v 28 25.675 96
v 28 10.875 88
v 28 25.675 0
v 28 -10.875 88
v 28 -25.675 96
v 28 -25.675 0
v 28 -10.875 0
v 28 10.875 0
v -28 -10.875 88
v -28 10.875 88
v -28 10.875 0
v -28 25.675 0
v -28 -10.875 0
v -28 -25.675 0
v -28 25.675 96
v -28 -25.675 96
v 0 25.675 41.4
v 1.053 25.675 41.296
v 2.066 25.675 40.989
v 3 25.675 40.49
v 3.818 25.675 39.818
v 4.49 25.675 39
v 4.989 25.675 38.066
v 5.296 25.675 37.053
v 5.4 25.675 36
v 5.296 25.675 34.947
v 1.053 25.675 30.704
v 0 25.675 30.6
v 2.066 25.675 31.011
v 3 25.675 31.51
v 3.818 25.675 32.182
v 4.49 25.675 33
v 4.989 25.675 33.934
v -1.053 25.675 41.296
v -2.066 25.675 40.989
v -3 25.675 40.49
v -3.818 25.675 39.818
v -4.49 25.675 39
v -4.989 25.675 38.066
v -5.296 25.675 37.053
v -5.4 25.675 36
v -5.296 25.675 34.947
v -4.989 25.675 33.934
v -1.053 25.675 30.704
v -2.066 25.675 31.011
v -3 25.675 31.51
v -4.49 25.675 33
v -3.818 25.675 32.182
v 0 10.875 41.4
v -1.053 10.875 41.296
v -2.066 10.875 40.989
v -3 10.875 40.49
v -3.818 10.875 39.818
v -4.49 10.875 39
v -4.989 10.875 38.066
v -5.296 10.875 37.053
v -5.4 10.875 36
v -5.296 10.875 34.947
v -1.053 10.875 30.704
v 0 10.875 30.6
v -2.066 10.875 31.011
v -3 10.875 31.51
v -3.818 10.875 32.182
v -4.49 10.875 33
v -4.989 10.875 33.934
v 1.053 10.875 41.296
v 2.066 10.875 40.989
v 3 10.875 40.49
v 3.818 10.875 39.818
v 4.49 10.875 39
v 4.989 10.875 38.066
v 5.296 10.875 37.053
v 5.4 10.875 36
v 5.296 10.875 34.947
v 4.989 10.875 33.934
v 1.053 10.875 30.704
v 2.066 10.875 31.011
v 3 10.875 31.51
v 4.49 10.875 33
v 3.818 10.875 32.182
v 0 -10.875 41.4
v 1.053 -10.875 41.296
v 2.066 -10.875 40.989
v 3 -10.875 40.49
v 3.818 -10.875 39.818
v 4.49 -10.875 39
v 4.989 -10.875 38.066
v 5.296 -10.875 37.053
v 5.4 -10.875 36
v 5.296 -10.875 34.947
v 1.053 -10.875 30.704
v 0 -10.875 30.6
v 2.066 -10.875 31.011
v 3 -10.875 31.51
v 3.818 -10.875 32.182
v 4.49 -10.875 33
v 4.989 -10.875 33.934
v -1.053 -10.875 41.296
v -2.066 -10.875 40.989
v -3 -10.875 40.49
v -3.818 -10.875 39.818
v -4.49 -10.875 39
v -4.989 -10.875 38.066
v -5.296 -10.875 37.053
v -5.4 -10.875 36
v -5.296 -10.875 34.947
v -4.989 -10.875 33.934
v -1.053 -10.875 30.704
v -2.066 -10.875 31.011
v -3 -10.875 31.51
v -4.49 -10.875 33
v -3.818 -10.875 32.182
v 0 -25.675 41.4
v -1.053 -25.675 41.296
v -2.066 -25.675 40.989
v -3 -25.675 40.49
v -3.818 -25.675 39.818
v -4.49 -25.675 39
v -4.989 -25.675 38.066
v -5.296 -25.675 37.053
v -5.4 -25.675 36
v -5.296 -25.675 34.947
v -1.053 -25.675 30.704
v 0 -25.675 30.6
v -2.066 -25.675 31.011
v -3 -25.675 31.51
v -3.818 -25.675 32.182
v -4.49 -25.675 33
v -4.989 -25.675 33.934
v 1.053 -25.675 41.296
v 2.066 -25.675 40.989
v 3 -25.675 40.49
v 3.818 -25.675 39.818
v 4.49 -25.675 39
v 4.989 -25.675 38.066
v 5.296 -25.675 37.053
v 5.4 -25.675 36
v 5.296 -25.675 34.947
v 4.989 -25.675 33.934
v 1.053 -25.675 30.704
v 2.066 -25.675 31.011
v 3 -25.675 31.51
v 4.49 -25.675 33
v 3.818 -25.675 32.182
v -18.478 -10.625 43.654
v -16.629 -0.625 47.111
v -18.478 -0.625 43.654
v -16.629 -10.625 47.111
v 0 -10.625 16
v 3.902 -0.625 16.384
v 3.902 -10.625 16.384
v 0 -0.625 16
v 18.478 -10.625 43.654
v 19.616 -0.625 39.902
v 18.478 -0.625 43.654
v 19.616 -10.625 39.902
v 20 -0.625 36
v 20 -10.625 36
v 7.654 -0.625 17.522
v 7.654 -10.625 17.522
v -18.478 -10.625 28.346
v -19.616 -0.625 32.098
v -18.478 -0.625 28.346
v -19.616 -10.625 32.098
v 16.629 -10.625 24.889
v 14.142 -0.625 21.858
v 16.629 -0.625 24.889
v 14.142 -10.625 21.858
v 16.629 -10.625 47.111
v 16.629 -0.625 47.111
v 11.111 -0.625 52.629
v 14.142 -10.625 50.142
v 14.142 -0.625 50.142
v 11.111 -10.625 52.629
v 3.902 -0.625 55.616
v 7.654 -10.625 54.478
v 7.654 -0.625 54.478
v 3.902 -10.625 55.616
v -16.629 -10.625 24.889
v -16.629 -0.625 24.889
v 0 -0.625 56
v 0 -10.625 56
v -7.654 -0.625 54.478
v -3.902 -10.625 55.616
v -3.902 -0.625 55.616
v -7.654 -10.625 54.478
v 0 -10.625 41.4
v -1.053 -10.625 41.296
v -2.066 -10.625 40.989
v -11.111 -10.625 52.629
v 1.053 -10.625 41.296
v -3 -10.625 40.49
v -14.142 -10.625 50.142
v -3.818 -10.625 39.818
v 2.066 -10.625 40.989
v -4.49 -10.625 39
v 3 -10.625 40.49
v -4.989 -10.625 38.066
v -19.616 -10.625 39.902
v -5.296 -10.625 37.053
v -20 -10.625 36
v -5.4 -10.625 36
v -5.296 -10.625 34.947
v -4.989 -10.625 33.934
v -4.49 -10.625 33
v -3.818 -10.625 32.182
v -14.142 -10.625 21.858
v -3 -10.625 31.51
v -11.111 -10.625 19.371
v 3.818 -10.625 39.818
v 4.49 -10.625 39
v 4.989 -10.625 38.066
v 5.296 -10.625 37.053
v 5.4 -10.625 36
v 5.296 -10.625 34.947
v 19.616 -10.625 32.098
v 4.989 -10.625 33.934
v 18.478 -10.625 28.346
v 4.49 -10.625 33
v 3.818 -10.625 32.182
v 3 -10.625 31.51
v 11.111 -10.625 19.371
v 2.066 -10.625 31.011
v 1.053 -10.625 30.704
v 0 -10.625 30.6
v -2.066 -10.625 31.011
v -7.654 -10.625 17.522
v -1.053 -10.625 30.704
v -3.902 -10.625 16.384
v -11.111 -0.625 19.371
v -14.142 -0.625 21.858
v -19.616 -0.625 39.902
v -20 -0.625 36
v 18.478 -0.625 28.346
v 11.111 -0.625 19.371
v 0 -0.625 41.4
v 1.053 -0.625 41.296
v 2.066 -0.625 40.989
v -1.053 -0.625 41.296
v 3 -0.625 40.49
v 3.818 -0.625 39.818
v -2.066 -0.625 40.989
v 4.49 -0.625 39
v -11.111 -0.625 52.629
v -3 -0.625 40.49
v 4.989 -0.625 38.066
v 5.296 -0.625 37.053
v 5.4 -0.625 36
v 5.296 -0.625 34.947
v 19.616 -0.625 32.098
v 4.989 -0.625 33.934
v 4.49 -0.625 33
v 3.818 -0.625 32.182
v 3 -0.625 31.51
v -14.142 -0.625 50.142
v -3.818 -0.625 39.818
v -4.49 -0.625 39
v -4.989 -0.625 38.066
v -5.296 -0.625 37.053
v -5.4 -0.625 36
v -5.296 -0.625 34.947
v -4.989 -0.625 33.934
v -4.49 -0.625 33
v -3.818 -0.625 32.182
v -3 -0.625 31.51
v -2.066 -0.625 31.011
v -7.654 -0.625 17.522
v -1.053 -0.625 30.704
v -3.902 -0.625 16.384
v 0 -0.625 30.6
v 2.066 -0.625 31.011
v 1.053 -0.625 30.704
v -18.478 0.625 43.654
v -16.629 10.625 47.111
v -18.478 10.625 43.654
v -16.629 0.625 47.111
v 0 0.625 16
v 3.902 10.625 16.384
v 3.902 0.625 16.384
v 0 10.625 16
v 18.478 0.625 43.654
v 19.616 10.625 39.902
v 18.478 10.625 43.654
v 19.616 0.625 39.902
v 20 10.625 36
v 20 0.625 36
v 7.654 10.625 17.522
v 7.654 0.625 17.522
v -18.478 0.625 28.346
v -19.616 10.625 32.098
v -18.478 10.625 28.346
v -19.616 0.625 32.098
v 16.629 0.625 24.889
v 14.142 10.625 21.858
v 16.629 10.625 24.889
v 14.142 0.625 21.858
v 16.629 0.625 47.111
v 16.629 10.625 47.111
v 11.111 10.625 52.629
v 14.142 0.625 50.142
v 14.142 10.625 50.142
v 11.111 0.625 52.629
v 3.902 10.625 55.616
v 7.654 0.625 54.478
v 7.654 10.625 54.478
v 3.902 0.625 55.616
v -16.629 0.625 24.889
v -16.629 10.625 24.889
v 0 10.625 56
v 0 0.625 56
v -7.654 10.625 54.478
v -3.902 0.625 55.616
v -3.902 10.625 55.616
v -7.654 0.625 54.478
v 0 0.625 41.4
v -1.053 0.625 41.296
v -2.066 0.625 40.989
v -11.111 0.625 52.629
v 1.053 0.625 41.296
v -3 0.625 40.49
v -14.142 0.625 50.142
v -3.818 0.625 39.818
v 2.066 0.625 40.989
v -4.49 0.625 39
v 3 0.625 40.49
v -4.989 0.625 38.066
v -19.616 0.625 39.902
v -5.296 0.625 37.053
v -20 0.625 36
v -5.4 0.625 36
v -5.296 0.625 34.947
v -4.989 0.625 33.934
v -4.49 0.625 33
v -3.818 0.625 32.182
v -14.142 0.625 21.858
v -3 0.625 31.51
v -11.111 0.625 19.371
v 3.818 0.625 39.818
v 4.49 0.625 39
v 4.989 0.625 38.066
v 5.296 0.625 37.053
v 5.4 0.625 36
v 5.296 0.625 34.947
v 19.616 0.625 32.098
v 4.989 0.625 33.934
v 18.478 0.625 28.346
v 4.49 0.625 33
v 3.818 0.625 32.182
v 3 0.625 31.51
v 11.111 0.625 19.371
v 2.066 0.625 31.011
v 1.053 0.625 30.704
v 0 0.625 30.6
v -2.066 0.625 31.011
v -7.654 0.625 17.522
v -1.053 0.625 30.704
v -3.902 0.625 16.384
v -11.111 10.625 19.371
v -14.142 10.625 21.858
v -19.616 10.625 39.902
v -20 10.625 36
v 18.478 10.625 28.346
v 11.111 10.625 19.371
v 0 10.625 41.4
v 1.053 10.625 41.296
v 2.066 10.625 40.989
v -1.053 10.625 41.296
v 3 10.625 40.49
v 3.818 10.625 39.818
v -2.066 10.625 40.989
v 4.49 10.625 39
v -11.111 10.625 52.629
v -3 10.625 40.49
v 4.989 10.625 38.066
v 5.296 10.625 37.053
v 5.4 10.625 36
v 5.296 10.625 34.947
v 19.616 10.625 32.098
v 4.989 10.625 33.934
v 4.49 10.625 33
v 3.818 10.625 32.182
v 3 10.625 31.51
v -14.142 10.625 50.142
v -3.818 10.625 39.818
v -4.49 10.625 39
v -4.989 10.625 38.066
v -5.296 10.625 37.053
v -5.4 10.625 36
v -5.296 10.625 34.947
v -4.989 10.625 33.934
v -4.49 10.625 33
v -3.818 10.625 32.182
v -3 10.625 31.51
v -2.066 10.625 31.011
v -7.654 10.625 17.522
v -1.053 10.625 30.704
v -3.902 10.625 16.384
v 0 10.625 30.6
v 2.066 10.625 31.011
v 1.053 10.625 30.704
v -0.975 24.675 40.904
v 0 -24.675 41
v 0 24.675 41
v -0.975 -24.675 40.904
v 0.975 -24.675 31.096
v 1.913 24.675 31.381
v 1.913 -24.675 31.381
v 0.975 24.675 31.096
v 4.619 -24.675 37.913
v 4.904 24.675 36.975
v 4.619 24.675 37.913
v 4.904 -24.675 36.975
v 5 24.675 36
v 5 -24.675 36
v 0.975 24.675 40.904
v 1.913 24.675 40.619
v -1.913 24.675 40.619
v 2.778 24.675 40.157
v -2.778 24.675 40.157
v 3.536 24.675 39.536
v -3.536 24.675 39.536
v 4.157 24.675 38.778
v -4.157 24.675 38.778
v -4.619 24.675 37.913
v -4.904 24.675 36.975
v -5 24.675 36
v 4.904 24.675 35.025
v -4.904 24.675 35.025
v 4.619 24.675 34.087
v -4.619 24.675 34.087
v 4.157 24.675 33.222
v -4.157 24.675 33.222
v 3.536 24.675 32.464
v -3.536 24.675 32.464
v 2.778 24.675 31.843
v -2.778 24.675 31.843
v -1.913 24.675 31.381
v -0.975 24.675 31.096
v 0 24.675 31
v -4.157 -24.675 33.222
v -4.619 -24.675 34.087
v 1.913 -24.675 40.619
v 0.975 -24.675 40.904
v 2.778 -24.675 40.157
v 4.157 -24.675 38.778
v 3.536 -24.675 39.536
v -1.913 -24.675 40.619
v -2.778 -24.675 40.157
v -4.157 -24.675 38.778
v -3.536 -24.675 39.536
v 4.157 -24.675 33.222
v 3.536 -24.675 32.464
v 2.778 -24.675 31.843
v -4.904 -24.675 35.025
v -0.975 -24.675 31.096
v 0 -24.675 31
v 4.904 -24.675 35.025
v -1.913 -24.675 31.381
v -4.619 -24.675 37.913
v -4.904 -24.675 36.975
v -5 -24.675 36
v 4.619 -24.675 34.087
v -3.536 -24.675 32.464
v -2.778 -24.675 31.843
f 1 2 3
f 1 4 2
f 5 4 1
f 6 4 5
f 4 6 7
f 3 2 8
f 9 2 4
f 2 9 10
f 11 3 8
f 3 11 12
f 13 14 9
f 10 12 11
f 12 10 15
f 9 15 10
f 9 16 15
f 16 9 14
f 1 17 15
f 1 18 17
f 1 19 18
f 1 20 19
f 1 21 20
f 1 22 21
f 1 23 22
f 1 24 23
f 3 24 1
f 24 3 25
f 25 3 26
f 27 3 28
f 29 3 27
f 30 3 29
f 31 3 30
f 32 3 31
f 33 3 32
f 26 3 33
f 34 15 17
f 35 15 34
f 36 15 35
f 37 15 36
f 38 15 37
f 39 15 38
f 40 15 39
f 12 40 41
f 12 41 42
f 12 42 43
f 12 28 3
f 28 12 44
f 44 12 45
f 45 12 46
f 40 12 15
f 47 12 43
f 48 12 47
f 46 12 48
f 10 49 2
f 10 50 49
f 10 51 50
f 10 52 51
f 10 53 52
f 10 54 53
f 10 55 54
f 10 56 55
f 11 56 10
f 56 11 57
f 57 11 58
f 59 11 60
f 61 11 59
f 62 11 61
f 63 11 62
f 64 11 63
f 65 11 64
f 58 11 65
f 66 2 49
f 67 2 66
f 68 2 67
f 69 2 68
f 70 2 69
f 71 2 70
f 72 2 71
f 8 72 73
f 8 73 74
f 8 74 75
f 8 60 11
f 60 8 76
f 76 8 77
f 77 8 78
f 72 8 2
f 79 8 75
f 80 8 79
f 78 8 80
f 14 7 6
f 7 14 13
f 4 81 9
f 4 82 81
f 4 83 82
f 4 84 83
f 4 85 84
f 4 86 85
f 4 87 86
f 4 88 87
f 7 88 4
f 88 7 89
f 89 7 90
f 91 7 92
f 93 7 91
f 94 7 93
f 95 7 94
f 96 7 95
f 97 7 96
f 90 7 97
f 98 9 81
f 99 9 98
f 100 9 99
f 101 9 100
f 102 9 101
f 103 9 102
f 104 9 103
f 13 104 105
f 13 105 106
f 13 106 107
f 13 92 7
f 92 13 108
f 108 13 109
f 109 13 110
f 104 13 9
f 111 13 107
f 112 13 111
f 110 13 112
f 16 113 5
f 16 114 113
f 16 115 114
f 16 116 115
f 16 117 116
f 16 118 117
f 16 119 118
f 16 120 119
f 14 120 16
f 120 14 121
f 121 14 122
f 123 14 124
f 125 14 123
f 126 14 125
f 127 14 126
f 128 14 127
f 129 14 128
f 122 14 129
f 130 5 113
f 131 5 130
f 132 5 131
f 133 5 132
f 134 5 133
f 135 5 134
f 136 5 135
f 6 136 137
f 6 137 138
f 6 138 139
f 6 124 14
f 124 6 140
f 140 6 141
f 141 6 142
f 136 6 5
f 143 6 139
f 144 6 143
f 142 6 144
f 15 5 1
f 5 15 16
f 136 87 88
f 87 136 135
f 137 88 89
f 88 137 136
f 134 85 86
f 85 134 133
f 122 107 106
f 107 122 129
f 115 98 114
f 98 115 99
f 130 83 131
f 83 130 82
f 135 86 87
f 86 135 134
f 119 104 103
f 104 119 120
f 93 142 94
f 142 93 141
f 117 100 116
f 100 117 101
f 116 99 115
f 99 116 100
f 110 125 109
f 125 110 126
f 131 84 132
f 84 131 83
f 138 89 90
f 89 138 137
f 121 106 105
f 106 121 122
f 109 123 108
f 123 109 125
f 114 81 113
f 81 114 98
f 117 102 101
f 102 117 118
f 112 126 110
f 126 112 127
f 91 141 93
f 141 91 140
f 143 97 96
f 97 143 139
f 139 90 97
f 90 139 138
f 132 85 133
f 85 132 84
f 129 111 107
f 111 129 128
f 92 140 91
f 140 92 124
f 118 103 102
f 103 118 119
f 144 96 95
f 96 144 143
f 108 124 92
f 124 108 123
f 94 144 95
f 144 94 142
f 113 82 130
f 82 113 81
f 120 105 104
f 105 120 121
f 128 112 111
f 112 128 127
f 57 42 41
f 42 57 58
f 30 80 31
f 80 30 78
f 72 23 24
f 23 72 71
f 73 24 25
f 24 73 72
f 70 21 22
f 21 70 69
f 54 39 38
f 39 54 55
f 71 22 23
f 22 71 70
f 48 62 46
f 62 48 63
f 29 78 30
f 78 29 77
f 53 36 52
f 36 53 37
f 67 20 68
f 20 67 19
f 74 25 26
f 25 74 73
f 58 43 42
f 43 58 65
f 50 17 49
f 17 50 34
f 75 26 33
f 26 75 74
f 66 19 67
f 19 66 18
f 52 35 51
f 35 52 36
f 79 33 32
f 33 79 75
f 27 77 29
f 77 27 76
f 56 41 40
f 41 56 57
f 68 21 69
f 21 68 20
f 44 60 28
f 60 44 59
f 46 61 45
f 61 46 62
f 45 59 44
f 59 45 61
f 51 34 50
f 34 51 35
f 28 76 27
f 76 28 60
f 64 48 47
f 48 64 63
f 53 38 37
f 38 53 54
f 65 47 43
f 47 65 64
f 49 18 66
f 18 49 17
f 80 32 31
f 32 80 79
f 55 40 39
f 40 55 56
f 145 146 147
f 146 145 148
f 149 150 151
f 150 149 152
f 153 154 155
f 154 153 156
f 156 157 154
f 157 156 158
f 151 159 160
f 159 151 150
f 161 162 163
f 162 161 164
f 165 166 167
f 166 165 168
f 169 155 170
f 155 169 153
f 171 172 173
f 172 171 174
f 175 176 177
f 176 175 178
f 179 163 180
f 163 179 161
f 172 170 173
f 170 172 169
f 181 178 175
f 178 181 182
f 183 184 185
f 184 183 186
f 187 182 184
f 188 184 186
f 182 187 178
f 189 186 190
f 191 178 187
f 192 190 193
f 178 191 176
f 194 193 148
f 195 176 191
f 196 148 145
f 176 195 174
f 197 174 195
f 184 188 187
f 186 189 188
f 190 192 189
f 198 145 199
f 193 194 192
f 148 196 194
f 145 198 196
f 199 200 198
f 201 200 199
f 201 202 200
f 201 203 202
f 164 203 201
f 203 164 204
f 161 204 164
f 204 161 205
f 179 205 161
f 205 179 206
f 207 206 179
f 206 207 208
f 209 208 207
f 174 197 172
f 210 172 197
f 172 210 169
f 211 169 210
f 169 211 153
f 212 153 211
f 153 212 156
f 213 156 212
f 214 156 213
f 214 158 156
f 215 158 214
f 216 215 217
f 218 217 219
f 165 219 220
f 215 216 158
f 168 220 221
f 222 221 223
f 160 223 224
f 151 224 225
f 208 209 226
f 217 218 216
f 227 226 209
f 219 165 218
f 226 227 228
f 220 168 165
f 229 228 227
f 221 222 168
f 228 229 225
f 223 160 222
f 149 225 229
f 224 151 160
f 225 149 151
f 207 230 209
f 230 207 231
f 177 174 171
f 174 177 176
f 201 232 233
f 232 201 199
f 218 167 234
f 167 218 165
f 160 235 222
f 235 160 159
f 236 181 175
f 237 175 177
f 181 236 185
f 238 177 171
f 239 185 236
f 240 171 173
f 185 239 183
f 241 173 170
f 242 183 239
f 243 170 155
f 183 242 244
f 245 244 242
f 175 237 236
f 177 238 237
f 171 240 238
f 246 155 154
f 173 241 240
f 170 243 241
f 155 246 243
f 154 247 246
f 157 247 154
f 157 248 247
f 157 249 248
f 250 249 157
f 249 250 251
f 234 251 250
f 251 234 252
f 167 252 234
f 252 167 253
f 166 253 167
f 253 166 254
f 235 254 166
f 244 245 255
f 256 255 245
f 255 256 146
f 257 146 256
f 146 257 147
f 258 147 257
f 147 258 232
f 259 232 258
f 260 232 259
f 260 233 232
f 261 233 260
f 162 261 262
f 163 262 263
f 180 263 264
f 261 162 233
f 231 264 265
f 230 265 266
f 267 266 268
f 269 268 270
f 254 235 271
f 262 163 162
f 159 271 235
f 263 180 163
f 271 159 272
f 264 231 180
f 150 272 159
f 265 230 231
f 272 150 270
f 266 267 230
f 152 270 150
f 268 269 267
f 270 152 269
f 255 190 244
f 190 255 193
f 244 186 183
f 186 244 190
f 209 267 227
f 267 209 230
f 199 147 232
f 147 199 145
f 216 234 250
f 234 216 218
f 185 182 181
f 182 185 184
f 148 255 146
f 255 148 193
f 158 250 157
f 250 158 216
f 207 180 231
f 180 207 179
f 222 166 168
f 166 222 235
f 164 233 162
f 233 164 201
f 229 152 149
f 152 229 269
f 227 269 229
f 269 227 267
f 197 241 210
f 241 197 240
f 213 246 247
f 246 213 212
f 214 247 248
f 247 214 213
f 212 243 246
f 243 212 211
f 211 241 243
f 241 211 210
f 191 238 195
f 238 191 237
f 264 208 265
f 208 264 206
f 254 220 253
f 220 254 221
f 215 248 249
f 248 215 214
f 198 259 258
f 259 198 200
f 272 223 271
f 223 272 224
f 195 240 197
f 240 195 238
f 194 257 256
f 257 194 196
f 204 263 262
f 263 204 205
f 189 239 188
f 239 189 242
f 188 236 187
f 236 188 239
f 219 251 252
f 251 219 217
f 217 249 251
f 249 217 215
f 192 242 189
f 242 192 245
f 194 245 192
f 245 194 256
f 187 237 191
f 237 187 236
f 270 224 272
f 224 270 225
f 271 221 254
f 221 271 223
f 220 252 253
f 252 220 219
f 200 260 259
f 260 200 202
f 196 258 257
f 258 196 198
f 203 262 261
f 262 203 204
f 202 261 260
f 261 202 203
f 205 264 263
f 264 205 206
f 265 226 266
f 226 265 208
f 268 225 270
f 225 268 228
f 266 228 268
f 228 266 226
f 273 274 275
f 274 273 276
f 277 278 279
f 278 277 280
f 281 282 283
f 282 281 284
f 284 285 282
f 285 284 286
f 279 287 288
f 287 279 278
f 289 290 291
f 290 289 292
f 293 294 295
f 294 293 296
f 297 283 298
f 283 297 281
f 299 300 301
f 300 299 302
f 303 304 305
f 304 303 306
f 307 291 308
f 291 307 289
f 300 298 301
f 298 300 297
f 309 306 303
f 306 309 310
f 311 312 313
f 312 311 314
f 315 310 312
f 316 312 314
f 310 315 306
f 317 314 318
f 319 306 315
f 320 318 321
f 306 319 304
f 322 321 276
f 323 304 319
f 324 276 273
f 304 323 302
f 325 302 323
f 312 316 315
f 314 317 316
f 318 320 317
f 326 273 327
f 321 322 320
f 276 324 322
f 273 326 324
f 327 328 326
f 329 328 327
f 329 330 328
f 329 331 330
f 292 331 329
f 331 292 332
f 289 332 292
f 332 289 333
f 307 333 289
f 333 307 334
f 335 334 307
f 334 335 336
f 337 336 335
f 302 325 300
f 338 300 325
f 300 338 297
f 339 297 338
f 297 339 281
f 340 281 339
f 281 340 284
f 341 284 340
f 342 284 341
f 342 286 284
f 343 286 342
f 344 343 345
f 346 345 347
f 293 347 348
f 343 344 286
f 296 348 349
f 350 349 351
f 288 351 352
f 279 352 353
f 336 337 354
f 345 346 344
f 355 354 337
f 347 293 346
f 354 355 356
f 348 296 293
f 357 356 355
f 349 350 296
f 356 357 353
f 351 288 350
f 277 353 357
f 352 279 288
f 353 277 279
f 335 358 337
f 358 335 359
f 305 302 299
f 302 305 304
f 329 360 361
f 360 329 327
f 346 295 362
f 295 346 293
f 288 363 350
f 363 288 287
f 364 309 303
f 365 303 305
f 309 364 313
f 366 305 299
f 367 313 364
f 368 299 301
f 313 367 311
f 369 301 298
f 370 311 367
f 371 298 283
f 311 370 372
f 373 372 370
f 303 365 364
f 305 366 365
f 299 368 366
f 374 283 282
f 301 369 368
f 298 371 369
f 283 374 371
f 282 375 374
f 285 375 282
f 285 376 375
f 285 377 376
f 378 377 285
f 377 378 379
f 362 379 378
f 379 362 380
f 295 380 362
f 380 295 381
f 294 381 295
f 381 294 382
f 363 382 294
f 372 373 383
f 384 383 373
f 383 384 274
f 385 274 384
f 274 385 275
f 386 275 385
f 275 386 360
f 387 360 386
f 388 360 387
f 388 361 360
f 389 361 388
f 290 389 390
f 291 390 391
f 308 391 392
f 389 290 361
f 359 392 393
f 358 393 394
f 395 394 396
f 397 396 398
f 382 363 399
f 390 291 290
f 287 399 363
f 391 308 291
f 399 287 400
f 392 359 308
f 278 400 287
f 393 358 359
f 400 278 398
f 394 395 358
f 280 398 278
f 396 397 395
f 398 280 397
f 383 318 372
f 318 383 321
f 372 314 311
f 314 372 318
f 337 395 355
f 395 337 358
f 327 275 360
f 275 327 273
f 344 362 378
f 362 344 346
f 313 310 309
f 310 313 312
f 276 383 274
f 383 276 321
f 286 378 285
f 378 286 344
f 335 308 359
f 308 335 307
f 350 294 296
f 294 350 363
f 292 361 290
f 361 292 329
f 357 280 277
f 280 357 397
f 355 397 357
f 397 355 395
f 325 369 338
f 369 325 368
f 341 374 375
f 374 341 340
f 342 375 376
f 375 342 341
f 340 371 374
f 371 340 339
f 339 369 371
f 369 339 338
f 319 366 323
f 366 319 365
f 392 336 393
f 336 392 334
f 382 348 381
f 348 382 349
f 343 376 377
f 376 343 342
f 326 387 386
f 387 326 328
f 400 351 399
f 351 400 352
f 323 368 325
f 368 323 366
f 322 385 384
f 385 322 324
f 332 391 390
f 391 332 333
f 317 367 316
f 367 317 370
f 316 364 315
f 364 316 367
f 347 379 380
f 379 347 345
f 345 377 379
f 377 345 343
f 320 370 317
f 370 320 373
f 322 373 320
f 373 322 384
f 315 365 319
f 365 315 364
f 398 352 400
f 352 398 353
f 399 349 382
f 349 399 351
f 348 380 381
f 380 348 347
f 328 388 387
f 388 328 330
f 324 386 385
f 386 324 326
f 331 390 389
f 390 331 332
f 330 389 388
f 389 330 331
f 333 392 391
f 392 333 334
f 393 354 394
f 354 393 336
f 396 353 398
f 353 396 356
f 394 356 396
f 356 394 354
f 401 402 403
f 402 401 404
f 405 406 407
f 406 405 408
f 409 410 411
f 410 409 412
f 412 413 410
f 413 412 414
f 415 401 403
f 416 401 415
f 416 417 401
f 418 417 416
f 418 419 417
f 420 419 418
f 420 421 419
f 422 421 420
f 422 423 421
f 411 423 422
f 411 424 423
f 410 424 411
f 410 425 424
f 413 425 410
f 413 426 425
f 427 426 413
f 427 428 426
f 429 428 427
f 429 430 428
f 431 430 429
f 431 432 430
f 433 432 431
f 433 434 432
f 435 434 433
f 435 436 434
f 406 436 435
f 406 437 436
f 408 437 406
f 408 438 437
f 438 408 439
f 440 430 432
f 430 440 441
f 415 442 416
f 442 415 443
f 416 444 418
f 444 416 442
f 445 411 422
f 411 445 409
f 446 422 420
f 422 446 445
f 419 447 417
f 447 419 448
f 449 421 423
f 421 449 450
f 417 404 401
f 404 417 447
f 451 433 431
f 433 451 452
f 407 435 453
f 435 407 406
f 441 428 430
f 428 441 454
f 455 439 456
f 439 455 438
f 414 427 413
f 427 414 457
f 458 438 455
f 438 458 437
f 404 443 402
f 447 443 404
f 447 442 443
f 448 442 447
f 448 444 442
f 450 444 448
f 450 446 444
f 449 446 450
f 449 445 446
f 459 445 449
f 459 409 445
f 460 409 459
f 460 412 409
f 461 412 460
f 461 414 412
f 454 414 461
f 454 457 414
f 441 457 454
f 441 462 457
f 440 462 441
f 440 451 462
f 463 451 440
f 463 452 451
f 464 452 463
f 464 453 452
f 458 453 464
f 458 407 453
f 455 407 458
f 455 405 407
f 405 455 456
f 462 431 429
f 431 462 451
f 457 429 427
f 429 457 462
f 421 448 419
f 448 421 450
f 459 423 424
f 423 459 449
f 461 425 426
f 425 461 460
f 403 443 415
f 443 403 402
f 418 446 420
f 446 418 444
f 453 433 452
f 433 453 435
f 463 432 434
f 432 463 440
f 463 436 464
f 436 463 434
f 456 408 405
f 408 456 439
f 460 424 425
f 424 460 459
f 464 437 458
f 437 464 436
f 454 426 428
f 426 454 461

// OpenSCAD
$fn = 32;

// ------------------------------------------------------------------------
// Trolley wheel set: wheels d40, fork 88 mm tall
// Every part is its own module, assembly() places every instance.
// ------------------------------------------------------------------------

// --- part 1 ---
module trolley_fork() {
  difference() {
    union() {
      translate([-28, 10.875, 0]) cube([56, 14.8, 88]);
      translate([-28, -25.675, 0]) cube([56, 14.8, 88]);
      translate([-28, -25.675, 88]) cube([56, 51.35, 8]);
    }
    translate([0, -18.275, 36]) rotate([90, 0, 0]) cylinder(h = 16.8, d = 10.8, center = true);
    translate([0, 18.275, 36]) rotate([90, 0, 0]) cylinder(h = 16.8, d = 10.8, center = true);
  }
}

// --- part 2 ---
module trolley_wheel() {
  difference() {
      translate([0, 0, 0]) cylinder(h = 10, d = 40);
      translate([0, 0, -1]) cylinder(h = 12, d = 10.8);
    }
}

// --- part 3 ---
module trolley_axle() {
  translate([0, 0, -24.675]) cylinder(h = 49.35, d = 10);
}

// --- assembly ---
module assembly() {
  color([0.80, 0.24, 0.20]) translate([0, 0, 0]) rotate([0, 0, 0]) trolley_fork();
  color([0.20, 0.45, 0.75]) translate([0, -0.625, 36]) rotate([90, 0, 0]) trolley_wheel();
  color([0.25, 0.62, 0.32]) translate([0, 10.625, 36]) rotate([90, 0, 0]) trolley_wheel();
  color([0.92, 0.70, 0.18]) translate([0, 0, 36]) rotate([90, 0, 0]) trolley_axle();
}

assembly();
